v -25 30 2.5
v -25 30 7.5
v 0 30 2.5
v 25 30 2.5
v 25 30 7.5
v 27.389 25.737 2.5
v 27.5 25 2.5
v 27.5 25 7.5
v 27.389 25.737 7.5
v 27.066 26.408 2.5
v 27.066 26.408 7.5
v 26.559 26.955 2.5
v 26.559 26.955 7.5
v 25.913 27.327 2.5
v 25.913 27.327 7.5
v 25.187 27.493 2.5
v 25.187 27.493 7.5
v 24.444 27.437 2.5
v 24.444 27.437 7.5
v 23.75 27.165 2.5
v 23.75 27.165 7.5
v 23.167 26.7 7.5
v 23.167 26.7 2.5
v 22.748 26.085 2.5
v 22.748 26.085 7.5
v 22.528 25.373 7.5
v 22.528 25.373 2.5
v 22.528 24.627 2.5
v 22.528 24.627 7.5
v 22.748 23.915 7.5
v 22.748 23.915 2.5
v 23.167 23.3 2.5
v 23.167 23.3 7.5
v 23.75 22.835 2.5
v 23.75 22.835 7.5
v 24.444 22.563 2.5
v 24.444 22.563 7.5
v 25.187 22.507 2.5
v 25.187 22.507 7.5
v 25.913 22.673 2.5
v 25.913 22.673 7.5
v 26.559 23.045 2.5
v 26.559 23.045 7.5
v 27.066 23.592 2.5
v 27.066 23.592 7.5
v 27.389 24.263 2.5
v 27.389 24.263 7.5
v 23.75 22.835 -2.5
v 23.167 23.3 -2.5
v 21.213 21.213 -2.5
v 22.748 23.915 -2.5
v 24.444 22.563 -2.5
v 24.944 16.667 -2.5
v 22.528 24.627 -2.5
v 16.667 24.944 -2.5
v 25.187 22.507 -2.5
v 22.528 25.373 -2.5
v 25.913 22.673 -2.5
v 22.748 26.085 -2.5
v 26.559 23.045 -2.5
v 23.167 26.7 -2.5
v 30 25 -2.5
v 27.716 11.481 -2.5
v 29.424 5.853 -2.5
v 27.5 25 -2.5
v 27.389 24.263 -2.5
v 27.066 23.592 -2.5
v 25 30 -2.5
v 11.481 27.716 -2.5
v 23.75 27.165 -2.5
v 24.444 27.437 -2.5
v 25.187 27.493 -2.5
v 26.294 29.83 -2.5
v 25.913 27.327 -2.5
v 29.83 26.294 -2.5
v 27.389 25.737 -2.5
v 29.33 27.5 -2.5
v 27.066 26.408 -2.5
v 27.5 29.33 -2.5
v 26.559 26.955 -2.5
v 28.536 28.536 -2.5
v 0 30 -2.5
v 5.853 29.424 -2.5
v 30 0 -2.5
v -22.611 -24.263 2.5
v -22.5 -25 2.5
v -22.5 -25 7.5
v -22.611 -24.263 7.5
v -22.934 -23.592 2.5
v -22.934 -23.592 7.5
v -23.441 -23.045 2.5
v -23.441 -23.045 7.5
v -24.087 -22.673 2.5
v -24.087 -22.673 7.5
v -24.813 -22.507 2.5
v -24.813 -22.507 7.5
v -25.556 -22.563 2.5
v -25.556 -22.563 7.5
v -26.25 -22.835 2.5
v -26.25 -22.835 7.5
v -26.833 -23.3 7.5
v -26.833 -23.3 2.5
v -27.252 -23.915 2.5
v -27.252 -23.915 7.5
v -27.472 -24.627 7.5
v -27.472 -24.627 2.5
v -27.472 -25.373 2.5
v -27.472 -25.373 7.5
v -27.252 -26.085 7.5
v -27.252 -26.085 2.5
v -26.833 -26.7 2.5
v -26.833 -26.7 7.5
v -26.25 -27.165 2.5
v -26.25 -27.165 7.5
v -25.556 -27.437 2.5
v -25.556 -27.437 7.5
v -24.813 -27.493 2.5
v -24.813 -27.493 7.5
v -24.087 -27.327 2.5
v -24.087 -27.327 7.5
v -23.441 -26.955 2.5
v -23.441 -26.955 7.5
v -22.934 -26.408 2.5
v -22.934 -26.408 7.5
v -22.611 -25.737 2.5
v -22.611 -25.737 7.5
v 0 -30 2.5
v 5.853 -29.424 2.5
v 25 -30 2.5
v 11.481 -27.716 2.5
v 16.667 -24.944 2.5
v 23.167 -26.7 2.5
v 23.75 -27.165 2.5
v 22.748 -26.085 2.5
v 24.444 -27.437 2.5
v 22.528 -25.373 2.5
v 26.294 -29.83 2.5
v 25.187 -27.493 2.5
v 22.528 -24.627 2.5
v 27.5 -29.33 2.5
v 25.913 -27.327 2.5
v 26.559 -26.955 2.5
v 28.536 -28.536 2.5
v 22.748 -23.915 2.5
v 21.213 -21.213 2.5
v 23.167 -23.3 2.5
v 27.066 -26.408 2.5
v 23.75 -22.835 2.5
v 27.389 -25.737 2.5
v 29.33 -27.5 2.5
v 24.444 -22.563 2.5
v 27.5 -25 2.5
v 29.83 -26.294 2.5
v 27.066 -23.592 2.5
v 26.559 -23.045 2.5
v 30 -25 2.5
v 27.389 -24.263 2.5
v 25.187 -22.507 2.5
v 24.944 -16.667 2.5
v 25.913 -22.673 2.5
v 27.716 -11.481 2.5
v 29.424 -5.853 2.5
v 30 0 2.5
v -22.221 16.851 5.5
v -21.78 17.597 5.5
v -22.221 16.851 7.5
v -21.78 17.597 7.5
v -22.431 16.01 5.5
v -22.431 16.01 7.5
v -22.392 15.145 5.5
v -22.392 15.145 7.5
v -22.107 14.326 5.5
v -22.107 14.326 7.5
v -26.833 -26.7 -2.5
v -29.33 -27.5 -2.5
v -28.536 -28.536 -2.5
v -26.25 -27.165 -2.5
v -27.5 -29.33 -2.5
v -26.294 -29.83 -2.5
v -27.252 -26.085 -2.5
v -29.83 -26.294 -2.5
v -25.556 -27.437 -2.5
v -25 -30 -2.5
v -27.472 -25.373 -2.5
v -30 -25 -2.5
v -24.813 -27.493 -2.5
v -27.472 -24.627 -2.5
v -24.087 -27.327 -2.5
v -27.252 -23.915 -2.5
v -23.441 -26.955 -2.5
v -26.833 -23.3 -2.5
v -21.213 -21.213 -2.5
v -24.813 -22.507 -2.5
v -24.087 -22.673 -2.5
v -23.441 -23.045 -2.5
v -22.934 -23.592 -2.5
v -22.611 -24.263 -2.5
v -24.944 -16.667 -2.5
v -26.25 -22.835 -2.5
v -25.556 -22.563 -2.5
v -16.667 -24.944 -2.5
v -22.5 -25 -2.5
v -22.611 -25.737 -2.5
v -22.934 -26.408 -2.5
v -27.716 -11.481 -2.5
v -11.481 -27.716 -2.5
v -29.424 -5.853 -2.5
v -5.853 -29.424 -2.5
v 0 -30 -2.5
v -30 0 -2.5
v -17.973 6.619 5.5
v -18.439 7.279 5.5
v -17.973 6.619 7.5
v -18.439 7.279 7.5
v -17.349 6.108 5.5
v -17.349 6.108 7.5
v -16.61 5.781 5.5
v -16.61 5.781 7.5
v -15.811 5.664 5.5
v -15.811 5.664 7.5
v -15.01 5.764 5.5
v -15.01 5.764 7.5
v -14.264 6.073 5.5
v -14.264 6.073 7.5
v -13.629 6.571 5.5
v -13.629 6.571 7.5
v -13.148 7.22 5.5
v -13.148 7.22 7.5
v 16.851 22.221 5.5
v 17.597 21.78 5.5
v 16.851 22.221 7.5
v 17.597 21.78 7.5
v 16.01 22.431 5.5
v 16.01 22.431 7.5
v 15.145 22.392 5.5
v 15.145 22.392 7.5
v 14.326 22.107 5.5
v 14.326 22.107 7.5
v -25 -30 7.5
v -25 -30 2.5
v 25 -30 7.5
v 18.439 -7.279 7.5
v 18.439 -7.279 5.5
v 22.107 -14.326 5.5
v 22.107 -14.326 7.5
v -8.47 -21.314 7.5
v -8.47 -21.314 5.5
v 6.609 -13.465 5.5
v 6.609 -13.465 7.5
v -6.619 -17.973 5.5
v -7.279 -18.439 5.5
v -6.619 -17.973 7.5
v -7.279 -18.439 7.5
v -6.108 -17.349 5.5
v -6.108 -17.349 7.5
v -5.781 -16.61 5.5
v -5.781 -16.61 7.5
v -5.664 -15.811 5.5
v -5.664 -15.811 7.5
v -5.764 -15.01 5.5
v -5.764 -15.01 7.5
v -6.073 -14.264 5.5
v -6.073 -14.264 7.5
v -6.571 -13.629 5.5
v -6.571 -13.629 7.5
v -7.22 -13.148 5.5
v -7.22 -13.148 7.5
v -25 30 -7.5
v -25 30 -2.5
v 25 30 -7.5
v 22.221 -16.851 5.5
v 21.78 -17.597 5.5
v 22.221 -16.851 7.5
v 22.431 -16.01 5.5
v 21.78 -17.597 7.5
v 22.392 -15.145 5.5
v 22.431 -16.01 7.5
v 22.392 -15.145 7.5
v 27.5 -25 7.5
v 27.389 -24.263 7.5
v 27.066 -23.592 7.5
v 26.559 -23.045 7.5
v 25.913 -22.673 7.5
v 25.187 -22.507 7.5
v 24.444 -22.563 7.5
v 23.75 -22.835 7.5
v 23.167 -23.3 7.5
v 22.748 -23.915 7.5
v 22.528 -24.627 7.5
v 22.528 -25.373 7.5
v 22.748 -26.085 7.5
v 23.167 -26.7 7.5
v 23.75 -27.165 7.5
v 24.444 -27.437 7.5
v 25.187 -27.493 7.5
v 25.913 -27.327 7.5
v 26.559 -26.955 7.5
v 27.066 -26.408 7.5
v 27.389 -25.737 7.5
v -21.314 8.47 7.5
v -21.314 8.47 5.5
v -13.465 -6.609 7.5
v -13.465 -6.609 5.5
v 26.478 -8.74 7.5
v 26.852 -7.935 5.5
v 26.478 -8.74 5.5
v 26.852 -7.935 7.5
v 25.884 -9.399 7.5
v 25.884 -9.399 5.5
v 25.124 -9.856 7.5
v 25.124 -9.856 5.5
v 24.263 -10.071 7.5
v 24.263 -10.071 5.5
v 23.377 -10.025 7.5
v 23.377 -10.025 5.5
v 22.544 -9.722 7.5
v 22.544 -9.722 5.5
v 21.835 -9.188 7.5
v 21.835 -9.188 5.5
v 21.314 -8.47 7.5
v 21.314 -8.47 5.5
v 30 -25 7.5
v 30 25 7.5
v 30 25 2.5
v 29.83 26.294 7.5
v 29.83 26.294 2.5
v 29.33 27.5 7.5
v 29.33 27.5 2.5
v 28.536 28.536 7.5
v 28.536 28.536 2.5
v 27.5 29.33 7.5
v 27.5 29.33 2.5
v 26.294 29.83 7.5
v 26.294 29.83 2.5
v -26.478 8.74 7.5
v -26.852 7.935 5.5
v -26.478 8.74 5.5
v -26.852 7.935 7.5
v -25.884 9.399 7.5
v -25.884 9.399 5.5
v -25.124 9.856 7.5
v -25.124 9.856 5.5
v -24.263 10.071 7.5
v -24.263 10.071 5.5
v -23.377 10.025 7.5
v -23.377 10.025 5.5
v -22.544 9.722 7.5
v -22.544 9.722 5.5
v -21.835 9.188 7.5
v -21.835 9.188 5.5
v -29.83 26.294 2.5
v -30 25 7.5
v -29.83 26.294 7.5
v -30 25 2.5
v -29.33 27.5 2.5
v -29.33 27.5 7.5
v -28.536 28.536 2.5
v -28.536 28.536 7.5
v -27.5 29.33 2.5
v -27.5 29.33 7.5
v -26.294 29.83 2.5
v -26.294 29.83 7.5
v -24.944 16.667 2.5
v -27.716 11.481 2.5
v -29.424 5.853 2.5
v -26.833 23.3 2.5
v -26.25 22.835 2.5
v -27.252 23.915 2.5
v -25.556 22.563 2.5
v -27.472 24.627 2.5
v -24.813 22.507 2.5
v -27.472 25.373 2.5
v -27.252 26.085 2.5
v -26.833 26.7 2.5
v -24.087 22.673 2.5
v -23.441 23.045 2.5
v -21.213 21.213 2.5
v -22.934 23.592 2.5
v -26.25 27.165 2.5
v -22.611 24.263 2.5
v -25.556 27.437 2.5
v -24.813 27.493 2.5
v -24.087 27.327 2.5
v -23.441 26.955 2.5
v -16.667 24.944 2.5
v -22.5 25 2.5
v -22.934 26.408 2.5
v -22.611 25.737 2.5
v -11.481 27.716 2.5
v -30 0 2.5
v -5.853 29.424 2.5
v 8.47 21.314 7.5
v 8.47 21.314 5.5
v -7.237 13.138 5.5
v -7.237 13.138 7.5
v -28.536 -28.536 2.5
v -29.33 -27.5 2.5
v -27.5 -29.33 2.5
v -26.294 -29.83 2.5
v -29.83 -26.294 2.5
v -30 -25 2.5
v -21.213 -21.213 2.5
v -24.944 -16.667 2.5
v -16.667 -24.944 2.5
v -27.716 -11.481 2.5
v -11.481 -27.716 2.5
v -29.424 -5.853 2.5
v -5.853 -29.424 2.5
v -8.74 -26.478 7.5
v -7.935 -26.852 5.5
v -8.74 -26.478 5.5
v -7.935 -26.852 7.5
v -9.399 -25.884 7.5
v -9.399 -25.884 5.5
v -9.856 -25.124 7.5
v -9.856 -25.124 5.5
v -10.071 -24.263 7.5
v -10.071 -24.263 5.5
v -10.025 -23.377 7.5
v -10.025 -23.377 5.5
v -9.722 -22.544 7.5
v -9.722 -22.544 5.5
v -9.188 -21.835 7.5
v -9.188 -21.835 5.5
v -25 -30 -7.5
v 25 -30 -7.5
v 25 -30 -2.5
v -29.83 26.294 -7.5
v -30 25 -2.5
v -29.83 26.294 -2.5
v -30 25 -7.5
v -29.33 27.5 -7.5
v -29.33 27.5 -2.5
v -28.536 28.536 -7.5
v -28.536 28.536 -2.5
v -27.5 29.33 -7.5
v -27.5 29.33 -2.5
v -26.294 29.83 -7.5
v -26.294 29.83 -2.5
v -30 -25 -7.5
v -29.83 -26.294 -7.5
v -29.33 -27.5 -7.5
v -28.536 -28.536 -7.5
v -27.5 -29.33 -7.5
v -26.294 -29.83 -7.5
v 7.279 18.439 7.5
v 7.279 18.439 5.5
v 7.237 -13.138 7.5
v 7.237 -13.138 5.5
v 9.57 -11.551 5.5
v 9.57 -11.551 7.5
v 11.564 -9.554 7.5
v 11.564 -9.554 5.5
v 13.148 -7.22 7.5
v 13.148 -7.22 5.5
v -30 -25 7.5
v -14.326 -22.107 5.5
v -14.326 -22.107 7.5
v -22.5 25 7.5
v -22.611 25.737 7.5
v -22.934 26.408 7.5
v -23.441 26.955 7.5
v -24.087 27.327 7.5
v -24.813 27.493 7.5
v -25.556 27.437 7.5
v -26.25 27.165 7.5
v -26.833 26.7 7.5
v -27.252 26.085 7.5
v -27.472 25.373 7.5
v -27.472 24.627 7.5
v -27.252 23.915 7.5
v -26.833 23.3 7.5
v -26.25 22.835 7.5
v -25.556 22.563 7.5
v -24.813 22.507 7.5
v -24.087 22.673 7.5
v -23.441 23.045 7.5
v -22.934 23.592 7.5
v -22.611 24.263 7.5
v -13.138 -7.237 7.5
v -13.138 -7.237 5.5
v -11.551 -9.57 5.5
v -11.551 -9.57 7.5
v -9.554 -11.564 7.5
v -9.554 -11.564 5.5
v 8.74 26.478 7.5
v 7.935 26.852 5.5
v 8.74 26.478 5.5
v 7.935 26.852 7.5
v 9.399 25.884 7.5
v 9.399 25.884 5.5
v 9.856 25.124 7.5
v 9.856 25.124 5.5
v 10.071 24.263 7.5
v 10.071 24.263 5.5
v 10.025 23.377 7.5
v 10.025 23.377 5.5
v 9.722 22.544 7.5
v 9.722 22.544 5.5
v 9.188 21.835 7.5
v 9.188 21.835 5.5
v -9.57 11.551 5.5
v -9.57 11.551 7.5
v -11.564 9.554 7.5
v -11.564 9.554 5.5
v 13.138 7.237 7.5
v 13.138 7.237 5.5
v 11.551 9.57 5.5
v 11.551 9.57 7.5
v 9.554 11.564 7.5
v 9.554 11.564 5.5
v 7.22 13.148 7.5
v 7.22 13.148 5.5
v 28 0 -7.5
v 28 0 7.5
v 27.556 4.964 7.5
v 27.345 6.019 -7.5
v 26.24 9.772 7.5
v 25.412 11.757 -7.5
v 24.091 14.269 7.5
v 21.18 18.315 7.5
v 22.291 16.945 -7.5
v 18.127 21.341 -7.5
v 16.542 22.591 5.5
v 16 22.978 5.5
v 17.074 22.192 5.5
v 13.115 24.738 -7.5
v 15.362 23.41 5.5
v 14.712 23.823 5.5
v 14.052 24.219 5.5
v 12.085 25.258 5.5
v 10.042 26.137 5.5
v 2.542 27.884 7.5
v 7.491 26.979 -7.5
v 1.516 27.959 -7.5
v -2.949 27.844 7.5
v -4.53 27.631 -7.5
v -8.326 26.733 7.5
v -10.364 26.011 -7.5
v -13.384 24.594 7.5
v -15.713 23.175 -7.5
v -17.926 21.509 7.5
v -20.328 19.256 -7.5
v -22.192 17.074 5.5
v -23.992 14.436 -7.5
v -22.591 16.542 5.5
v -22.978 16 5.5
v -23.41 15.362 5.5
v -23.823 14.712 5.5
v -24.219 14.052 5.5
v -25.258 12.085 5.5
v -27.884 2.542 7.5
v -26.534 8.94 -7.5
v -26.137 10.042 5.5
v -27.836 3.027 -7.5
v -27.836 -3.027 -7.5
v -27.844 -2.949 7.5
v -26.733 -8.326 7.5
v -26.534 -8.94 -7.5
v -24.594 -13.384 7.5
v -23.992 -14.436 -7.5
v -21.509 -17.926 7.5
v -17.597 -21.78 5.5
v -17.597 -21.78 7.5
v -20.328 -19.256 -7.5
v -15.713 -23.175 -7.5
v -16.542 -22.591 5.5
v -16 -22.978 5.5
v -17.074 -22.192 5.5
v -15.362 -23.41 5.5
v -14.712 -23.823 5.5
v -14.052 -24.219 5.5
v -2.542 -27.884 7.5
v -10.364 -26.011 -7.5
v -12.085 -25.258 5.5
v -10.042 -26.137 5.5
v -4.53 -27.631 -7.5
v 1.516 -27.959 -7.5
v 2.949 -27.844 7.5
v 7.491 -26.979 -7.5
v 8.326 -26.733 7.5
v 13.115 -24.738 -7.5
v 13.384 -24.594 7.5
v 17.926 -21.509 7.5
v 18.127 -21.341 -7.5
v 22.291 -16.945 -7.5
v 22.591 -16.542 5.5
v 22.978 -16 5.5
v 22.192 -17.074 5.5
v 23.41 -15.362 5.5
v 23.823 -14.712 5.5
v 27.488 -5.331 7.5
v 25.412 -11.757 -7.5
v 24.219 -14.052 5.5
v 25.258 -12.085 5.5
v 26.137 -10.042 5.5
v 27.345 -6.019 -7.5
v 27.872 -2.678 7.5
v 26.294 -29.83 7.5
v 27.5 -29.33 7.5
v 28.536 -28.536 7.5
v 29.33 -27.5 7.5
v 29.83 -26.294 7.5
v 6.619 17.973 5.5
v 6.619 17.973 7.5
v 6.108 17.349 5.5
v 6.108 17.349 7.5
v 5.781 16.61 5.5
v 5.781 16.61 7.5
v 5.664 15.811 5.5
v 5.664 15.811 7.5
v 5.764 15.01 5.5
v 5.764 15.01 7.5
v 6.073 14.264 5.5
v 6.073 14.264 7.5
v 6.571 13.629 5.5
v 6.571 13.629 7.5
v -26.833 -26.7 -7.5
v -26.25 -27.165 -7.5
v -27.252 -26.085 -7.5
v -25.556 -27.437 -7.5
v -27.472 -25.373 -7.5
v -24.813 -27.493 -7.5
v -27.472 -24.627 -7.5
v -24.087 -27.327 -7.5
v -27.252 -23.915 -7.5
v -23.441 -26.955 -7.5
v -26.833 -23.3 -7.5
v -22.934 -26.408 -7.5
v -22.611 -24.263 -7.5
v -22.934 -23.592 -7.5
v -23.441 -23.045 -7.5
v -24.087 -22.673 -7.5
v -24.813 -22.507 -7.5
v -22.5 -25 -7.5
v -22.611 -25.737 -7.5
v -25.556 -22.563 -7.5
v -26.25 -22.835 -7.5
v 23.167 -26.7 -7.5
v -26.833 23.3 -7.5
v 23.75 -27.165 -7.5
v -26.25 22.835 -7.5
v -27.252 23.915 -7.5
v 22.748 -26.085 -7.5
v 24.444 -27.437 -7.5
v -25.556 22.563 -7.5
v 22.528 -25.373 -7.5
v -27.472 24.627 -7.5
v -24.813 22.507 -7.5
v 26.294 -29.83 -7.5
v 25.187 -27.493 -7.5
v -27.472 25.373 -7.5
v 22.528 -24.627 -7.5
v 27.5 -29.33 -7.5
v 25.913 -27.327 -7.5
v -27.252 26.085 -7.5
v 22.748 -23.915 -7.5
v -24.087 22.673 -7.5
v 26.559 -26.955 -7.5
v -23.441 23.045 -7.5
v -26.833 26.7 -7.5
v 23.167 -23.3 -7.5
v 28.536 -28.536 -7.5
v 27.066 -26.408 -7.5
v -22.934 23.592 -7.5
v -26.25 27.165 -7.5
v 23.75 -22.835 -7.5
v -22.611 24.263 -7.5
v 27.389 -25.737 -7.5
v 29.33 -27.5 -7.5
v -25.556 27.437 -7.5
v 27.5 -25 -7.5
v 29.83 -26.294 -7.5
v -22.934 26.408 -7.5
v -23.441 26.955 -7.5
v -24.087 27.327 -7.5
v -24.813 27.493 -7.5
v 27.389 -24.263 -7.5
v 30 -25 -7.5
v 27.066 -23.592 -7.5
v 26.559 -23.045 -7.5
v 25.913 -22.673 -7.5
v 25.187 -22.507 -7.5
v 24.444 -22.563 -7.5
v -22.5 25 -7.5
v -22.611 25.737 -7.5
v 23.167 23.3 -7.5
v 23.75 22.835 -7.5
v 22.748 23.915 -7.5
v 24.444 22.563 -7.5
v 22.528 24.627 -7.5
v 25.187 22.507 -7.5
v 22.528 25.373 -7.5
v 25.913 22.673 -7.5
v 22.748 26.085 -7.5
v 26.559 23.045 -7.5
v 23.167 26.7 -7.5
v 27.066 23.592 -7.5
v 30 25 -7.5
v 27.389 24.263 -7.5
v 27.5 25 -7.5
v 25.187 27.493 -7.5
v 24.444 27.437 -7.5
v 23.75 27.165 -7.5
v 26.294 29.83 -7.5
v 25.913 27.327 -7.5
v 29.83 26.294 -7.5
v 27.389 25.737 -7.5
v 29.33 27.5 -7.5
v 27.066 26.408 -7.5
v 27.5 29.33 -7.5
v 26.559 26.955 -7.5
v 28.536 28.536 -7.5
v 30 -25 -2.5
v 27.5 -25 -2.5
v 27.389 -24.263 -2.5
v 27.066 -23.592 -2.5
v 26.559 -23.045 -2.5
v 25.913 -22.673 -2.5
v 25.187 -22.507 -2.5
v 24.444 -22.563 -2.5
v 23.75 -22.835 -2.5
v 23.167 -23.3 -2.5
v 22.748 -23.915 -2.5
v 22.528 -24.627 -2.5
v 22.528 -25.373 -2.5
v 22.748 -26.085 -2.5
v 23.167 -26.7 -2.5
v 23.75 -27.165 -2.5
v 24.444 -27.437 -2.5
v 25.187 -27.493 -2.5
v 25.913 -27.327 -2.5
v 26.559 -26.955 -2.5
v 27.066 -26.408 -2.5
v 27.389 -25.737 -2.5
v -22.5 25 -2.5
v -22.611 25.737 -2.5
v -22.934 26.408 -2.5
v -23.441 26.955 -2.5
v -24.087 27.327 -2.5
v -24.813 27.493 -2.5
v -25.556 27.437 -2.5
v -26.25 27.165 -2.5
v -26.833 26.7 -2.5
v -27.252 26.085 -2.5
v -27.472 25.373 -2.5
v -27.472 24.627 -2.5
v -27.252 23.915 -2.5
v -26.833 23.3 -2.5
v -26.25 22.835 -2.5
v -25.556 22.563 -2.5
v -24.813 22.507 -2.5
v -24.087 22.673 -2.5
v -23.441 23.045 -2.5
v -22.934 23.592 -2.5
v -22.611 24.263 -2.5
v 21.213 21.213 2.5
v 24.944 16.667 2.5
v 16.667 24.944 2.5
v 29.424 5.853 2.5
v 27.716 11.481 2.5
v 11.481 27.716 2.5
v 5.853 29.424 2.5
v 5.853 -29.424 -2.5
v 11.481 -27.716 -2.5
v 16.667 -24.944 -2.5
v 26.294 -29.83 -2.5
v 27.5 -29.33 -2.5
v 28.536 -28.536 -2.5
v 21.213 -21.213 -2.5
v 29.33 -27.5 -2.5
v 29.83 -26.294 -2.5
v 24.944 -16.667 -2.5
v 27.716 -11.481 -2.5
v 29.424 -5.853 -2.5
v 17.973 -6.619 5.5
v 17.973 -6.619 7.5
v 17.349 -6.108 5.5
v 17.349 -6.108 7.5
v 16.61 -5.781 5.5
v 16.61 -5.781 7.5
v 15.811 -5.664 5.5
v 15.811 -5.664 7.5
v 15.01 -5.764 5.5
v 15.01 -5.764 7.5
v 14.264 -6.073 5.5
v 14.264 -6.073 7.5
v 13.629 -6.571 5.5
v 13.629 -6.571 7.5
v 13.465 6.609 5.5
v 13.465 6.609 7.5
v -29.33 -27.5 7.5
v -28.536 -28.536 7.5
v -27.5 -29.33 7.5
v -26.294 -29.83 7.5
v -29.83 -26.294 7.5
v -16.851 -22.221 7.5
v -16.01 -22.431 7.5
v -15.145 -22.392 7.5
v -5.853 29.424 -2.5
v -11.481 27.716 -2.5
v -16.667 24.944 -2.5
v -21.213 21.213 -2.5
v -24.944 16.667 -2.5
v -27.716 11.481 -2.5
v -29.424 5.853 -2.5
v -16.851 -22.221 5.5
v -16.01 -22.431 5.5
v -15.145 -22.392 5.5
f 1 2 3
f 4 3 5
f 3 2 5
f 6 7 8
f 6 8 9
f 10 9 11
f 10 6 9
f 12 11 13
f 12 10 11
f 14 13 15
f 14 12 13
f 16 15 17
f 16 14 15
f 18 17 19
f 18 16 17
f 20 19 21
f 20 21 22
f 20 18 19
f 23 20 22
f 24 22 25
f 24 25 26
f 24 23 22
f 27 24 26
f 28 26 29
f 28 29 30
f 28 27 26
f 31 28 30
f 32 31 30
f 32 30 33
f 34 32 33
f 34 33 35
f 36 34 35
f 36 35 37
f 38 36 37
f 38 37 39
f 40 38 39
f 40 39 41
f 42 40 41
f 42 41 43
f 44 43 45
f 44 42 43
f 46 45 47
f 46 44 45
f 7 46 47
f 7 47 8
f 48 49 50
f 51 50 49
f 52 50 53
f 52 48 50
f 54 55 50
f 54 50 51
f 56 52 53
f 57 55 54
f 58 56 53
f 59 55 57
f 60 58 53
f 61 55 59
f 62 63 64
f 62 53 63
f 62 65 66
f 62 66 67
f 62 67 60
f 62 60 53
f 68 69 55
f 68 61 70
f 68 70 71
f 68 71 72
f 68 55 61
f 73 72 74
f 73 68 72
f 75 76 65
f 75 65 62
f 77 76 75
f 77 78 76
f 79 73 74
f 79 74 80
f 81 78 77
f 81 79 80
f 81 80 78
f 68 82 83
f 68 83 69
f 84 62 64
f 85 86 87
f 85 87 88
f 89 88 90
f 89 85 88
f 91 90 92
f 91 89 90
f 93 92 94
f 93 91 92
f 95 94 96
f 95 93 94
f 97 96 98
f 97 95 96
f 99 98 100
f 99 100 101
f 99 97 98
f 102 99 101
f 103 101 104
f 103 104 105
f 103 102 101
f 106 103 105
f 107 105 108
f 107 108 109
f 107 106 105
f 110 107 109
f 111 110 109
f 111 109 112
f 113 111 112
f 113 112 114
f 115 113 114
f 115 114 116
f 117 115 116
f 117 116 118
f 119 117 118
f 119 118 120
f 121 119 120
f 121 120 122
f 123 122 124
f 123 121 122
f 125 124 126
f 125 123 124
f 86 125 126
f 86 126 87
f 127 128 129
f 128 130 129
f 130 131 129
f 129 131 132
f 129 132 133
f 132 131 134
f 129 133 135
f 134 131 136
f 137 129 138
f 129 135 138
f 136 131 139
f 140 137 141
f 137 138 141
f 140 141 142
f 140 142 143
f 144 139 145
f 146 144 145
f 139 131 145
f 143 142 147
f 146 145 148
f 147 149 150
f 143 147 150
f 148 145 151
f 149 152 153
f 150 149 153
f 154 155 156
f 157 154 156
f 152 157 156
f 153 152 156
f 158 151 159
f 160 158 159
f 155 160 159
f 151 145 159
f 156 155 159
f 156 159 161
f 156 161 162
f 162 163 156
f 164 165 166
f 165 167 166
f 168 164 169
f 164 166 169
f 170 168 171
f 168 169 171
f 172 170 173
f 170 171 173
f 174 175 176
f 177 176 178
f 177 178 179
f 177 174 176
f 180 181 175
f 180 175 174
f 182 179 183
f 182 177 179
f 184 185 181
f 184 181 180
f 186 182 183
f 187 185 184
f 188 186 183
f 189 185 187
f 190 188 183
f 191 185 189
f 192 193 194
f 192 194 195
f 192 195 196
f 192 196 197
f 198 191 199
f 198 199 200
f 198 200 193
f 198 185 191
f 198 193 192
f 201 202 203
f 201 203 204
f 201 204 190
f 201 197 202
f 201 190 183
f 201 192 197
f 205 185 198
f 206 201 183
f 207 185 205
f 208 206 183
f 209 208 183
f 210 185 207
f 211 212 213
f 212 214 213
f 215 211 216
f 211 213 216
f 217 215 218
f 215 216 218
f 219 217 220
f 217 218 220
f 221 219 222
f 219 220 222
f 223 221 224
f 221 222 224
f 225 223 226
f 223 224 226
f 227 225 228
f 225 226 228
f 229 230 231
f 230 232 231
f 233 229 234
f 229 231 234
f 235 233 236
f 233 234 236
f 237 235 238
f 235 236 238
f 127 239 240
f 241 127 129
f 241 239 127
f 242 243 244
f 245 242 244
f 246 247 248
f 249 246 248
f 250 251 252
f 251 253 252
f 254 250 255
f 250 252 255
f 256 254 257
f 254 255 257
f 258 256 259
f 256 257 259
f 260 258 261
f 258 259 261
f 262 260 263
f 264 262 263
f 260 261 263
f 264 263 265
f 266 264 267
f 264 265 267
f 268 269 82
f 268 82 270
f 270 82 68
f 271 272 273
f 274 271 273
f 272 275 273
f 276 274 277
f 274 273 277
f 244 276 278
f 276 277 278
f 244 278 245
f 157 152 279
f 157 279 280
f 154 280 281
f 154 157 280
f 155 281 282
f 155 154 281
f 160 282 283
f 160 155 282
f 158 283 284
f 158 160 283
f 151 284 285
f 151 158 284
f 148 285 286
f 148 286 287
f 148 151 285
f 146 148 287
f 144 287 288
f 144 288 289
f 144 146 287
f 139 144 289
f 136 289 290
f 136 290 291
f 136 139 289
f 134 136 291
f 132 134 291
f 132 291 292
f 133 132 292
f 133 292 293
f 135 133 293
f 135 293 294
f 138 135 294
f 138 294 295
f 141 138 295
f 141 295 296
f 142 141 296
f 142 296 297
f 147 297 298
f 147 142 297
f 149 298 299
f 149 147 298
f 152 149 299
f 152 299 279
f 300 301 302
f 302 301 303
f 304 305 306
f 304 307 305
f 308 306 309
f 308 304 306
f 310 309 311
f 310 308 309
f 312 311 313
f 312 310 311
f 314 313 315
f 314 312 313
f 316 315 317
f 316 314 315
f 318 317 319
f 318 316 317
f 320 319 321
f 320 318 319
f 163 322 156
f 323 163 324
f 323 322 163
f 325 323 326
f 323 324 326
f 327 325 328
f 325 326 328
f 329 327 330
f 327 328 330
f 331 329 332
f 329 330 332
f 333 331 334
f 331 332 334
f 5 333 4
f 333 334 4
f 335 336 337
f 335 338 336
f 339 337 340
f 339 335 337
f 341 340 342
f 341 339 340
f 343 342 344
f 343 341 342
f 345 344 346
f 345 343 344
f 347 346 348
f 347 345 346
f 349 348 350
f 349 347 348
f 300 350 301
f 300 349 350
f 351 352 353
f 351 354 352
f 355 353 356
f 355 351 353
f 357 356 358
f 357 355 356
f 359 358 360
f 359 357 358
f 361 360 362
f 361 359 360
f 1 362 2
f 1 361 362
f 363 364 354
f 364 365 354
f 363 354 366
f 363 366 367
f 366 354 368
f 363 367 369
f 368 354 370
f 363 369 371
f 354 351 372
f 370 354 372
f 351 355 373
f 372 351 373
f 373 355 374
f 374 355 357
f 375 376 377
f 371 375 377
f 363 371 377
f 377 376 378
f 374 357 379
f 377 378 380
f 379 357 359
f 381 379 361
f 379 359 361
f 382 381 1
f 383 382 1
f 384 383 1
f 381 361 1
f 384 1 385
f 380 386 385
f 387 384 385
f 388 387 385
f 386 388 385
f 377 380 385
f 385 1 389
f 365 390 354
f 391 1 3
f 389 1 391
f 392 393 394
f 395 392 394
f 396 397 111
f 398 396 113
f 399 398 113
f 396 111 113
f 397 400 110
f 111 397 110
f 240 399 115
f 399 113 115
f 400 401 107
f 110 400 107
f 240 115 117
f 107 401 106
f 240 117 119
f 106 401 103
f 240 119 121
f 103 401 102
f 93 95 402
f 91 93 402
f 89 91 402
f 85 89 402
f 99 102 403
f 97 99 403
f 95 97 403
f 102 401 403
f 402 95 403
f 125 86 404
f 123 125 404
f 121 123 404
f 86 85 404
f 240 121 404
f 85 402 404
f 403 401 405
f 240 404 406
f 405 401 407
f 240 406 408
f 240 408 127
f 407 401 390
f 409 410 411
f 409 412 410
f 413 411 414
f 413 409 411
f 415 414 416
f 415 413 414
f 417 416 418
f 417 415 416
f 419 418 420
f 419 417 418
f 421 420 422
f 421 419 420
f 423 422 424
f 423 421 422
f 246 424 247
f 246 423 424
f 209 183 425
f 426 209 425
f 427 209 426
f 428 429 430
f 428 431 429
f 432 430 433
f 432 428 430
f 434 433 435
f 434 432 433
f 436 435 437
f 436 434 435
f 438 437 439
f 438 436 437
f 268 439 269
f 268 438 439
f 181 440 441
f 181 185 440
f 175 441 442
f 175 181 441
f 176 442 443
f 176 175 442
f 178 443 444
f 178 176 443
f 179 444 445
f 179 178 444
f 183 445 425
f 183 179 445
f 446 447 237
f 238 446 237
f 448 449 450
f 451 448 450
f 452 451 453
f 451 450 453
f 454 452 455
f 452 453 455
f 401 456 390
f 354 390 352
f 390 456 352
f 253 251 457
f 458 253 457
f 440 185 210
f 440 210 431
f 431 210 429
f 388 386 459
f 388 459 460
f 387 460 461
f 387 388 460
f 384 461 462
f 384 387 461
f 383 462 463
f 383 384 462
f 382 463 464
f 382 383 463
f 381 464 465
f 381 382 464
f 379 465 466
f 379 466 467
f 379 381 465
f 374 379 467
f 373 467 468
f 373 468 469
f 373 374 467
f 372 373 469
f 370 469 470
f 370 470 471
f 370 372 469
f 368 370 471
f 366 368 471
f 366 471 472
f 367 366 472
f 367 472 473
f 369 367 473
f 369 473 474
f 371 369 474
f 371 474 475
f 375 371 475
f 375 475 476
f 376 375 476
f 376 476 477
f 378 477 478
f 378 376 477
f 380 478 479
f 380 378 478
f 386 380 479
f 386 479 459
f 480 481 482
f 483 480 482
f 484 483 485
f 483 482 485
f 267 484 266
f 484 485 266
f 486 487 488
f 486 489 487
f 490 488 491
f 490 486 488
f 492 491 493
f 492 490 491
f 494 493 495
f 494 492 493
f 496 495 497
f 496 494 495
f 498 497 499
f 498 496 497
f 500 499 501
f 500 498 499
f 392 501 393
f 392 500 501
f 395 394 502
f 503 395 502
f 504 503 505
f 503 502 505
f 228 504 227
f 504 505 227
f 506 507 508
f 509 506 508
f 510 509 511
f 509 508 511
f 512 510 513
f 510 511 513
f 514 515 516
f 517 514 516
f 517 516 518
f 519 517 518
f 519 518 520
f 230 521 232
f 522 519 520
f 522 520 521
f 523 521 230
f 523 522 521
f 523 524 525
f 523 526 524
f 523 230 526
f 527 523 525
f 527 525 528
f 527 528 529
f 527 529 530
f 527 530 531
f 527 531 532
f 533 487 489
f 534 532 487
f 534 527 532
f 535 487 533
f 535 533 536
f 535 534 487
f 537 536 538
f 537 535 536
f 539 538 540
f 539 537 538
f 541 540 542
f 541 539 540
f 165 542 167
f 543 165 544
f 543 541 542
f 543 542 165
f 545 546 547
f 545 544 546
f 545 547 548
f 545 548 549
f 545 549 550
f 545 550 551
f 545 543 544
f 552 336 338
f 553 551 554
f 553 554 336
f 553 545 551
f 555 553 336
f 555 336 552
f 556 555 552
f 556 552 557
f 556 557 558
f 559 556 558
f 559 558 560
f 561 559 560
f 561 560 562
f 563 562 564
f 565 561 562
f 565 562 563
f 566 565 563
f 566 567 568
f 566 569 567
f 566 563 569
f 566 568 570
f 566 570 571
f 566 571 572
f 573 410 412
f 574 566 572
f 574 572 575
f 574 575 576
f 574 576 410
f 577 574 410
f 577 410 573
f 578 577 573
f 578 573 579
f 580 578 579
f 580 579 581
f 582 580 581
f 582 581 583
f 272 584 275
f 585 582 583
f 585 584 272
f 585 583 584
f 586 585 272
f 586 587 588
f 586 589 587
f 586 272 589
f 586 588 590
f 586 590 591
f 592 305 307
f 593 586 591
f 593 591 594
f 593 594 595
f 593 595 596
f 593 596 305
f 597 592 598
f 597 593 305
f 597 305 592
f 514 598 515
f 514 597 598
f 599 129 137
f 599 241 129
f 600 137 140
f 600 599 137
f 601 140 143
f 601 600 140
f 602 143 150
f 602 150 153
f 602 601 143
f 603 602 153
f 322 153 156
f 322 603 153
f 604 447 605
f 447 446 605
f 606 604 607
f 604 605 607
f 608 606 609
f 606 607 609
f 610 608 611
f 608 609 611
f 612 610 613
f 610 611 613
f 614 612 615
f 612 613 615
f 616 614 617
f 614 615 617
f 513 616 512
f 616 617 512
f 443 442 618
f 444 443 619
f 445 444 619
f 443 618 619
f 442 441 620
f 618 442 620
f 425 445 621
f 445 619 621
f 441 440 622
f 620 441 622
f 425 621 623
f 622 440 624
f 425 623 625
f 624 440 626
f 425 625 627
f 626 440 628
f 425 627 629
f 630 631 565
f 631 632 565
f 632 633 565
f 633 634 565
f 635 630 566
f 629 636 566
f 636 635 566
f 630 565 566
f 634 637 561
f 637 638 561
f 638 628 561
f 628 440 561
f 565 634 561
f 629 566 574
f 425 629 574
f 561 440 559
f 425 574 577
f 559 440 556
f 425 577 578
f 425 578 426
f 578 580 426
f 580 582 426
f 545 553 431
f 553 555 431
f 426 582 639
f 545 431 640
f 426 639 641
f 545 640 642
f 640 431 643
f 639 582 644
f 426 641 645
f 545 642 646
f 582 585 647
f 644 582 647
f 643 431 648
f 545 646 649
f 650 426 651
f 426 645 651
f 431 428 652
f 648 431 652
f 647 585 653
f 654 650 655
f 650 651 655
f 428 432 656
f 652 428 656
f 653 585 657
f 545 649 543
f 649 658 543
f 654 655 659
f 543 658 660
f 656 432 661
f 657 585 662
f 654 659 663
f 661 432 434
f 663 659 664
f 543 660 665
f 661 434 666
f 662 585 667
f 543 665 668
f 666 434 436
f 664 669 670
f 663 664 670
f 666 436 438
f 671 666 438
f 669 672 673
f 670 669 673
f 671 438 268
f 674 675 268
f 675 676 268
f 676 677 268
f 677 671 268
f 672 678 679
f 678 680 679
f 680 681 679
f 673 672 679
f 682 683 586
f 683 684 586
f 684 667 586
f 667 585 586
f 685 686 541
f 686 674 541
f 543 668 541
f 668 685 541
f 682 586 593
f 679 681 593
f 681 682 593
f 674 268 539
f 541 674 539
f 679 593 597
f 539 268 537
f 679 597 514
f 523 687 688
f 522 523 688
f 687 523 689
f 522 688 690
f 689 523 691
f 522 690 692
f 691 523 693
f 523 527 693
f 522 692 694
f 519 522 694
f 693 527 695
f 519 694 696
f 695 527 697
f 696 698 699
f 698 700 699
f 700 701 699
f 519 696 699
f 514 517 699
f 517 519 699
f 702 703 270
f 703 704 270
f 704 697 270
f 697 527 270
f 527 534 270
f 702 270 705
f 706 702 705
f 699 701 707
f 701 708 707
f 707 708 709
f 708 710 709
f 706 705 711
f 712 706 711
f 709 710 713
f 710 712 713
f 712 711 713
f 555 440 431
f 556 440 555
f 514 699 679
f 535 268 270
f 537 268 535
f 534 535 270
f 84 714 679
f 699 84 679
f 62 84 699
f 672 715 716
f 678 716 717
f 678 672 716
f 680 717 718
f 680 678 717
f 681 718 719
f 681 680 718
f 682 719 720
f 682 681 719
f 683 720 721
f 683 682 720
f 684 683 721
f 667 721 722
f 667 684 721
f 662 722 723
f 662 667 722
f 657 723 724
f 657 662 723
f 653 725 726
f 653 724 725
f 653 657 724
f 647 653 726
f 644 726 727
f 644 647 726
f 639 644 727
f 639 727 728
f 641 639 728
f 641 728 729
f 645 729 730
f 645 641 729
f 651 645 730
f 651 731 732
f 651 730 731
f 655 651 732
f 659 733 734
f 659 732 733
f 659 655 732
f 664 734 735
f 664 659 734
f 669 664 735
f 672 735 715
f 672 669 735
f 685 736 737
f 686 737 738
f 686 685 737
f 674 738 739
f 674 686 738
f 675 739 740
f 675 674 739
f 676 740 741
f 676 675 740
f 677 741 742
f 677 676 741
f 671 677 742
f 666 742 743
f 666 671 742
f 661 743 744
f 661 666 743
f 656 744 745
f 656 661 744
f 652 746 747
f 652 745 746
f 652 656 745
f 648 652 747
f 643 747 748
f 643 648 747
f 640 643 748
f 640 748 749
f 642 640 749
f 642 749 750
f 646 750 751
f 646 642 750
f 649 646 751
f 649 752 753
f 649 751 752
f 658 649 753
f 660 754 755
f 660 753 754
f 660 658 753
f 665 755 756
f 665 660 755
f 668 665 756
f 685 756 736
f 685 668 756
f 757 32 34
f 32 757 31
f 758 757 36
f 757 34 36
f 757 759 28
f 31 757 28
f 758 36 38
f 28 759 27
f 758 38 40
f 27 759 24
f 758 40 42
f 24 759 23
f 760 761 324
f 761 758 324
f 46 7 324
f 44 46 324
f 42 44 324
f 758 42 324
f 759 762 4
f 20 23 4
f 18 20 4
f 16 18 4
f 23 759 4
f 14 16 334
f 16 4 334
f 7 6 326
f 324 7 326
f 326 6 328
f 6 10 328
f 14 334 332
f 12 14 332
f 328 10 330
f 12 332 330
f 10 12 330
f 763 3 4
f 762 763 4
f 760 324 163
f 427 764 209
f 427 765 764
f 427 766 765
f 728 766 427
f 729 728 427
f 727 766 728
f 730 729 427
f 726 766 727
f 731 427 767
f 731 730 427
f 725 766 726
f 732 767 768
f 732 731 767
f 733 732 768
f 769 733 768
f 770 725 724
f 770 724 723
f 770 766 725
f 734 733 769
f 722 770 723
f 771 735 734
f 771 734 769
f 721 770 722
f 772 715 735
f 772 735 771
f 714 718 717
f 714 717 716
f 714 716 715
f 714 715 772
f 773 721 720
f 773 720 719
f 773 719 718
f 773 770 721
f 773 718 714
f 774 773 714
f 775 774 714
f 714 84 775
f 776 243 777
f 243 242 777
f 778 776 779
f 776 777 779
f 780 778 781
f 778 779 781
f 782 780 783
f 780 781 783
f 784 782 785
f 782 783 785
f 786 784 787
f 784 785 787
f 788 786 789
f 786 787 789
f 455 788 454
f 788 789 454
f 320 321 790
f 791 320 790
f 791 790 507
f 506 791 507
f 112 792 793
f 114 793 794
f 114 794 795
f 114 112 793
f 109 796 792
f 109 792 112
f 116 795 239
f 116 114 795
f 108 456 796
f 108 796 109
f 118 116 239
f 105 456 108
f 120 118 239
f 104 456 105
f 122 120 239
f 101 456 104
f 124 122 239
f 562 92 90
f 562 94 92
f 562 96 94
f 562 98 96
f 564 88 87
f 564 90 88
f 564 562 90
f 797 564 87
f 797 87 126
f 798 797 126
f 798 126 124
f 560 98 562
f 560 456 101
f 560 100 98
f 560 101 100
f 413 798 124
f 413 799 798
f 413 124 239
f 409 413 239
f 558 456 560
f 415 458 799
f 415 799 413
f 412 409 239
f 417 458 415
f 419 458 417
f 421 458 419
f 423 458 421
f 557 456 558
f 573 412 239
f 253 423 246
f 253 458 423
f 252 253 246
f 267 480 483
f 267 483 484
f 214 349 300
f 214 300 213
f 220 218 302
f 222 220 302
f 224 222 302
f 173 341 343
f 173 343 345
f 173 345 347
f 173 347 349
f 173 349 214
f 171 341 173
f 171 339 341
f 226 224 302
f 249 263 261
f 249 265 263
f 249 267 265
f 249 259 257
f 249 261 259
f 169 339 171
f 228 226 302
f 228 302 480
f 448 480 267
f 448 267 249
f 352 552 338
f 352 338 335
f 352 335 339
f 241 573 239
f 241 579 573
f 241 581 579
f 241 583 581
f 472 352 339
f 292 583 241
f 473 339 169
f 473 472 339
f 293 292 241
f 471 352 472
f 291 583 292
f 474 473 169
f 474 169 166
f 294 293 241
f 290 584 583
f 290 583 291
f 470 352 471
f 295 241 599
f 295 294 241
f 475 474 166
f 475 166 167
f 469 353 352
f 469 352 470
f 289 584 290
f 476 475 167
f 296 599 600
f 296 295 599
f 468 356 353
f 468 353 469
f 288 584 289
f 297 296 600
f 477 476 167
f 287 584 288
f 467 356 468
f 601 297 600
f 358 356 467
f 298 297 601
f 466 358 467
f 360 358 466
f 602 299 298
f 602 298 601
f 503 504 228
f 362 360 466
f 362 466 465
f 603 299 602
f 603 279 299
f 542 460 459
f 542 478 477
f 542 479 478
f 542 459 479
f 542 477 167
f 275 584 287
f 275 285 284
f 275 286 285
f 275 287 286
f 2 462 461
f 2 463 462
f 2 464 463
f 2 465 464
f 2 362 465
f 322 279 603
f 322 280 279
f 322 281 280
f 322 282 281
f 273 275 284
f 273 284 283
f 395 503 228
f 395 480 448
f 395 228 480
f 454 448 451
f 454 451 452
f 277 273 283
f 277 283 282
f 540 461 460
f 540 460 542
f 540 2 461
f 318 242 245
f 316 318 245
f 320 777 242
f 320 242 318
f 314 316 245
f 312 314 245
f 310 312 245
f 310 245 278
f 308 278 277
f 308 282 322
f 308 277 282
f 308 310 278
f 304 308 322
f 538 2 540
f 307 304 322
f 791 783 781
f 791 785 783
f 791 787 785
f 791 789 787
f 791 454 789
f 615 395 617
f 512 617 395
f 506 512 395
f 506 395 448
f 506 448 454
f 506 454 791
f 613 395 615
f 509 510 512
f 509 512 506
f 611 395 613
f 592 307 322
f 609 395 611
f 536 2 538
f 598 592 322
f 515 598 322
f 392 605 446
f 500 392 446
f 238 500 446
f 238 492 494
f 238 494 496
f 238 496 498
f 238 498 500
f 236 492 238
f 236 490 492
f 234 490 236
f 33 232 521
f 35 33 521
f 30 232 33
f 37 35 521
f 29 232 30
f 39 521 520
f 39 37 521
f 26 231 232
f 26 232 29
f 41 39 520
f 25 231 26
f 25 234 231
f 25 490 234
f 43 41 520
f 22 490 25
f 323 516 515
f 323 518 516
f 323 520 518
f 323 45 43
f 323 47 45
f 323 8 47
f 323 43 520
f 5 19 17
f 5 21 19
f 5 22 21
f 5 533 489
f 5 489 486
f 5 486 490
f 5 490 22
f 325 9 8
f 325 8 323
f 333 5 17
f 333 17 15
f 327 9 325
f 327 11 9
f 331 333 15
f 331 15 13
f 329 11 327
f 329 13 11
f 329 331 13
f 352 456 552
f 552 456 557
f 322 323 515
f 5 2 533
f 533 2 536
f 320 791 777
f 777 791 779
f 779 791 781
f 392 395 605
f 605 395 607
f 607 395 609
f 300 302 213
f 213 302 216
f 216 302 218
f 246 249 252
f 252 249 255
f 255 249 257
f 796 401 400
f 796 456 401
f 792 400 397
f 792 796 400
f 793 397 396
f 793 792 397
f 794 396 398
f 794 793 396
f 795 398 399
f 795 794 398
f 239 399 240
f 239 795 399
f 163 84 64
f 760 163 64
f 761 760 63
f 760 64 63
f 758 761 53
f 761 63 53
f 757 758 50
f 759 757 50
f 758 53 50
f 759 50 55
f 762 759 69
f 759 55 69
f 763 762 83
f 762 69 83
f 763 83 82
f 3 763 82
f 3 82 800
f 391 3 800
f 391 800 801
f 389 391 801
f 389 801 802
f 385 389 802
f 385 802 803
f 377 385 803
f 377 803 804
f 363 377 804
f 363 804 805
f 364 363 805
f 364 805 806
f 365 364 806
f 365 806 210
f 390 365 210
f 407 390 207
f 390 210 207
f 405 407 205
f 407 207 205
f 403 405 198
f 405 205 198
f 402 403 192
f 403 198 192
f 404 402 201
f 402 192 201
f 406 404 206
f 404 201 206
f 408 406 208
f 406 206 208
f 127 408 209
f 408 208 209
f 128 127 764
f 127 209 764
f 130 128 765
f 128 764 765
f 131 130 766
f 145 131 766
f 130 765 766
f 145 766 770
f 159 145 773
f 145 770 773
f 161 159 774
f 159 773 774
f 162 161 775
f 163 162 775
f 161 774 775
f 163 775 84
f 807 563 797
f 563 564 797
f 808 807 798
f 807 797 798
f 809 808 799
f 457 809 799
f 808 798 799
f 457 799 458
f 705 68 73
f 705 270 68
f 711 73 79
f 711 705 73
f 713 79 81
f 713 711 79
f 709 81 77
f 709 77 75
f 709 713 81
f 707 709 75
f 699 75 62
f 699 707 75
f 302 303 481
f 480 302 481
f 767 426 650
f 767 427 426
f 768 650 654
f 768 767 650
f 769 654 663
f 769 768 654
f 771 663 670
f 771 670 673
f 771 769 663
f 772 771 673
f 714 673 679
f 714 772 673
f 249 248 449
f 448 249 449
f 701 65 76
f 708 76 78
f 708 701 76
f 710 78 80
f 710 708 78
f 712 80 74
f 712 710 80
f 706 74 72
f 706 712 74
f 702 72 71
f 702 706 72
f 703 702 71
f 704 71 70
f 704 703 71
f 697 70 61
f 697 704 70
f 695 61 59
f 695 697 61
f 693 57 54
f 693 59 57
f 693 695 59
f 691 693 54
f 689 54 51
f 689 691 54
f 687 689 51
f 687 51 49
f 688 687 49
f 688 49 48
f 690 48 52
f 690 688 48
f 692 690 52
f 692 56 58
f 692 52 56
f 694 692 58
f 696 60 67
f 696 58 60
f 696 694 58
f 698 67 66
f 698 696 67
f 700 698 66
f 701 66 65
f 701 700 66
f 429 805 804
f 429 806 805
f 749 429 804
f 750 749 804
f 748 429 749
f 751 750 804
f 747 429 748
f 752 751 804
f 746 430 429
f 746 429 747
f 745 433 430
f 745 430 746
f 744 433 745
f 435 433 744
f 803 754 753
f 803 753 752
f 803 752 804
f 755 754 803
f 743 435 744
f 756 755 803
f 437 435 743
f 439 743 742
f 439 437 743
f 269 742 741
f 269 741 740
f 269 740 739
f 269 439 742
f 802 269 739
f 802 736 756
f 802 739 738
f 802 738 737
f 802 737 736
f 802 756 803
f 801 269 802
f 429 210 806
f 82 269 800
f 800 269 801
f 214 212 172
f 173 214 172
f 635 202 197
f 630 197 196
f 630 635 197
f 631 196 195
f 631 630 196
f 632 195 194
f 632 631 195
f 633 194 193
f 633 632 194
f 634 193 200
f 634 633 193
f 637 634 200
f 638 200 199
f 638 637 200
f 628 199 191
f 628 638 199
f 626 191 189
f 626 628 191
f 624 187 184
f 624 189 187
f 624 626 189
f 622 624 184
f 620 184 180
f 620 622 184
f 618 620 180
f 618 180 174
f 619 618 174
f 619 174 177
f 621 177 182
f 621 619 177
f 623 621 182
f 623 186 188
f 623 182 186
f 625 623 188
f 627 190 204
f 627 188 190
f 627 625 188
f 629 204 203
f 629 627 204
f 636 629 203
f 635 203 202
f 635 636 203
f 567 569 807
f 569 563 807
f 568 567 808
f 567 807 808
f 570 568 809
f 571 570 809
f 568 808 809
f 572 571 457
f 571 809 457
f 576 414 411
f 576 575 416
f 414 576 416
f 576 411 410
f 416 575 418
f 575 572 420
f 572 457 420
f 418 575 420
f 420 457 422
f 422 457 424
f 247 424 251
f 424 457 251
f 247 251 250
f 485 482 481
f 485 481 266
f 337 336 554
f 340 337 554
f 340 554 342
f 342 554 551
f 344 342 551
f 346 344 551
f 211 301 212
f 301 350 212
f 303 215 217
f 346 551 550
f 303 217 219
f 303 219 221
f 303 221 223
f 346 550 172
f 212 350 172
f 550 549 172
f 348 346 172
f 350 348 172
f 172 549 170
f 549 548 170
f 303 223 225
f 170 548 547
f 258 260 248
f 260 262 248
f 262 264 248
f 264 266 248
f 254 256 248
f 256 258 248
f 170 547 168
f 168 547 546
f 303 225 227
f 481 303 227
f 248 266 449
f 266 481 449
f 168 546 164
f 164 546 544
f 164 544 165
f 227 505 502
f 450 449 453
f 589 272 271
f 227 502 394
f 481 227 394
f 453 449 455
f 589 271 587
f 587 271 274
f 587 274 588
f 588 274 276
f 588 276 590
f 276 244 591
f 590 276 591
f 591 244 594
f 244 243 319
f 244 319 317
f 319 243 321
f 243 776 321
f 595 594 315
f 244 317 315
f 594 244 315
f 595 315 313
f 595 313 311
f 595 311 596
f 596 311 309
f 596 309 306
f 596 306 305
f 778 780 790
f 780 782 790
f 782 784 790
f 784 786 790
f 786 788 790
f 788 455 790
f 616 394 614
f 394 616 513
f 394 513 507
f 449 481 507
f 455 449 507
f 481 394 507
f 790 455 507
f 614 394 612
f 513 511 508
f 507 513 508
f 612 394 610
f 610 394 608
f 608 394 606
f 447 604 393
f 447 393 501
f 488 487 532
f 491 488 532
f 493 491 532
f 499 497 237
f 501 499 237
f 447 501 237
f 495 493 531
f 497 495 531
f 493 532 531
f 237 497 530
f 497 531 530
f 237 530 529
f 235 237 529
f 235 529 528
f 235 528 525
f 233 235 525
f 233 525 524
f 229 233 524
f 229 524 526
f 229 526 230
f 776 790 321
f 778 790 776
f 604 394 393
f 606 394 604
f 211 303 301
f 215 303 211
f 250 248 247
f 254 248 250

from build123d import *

# Parameters (mm, degrees)
SKETCH1_W           = 60
SKETCH1_H           = 60
SKETCH1_R           = 28
SKETCH1_R_2         = 2.5
BOSS_EXTRUDE1_DEPTH = 7.5
SKETCH2_W           = 83.422483418
SKETCH2_H           = 79.797227822
SKETCH2_R           = 30
CUT_EXTRUDE1_DEPTH  = 2.5
BOSS_EXTRUDE2_START = -2
BOSS_EXTRUDE2_DEPTH = 2
FILLET1_R           = 3
FILLET2_R           = 5


with BuildPart() as part:
    # Sketch1 → Boss-Extrude1 (new, symmetric)
    with BuildSketch(Plane.XY):
        Rectangle(SKETCH1_W, SKETCH1_H)
        Circle(SKETCH1_R, mode=Mode.SUBTRACT)
        with Locations((25, 25)):
            Circle(SKETCH1_R_2, mode=Mode.SUBTRACT)
        with Locations((-25, 25)):
            Circle(SKETCH1_R_2, mode=Mode.SUBTRACT)
        with Locations((-25, -25)):
            Circle(SKETCH1_R_2, mode=Mode.SUBTRACT)
        with Locations((25, -25)):
            Circle(SKETCH1_R_2, mode=Mode.SUBTRACT)
    extrude(amount=BOSS_EXTRUDE1_DEPTH, both=True)

    # Sketch2 → Cut-Extrude1 (cut, symmetric)
    with BuildSketch(Plane.XY):
        Rectangle(SKETCH2_W, SKETCH2_H)
        Circle(SKETCH2_R, mode=Mode.SUBTRACT)
    extrude(amount=CUT_EXTRUDE1_DEPTH, both=True, mode=Mode.SUBTRACT)

    # Sketch3 → Boss-Extrude2 (add)
    with BuildSketch(Plane.XY.offset(7.5).offset(BOSS_EXTRUDE2_START)):
        with BuildLine():
            Line((14.986146269, -0.644530834), (22.978250586, -16))
            ThreePointArc((22.978250586, -16), (23.61864626, -15.038601957), (24.218842251, -14.051607738))
            Line((24.218842251, -14.051607738), (13.465479299, 6.609150267))
            Line((13.465479299, 6.609150267), (13.13845395, 7.237473855))
            ThreePointArc((13.13845395, 7.237473855), (7.905893272, 12.747425292), (0.644530834, 14.986146269))
            Line((0.644530834, 14.986146269), (16, 22.978250586))
            ThreePointArc((16, 22.978250586), (15.038601957, 23.61864626), (14.051607738, 24.218842251))
            Line((14.051607738, 24.218842251), (-7.237473855, 13.13845395))
            ThreePointArc((-7.237473855, 13.13845395), (-12.747425292, 7.905893272), (-14.986146269, 0.644530834))
            Line((-14.986146269, 0.644530834), (-22.978250586, 16))
            ThreePointArc((-22.978250586, 16), (-23.61864626, 15.038601957), (-24.218842251, 14.051607738))
            Line((-24.218842251, 14.051607738), (-13.465479299, -6.609150267))
            Line((-13.465479299, -6.609150267), (-13.13845395, -7.237473855))
            ThreePointArc((-13.13845395, -7.237473855), (-7.905893272, -12.747425292), (-0.644530834, -14.986146269))
            Line((-0.644530834, -14.986146269), (-16, -22.978250586))
            ThreePointArc((-16, -22.978250586), (-15.038601957, -23.61864626), (-14.051607738, -24.218842251))
            Line((-14.051607738, -24.218842251), (6.609150267, -13.465479299))
            Line((6.609150267, -13.465479299), (7.237473855, -13.13845395))
            ThreePointArc((7.237473855, -13.13845395), (12.747425292, -7.905893272), (14.986146269, -0.644530834))
        make_face()
    extrude(amount=BOSS_EXTRUDE2_DEPTH)

    # Fillet1
    fillet1_edges = [part.edges().sort_by_distance(p)[0] for p in [
        (24.218842251, -14.051607738, 6.5),
        (22.978250586, -16, 6.5),
        (14.986146269, -0.644530834, 6.5),
        (-14.051607738, -24.218842251, 6.5),
        (-16, -22.978250586, 6.5),
        (-0.644530834, -14.986146269, 6.5),
        (-24.218842251, 14.051607738, 6.5),
        (-22.978250586, 16, 6.5),
        (-14.986146269, 0.644530834, 6.5),
        (14.051607738, 24.218842251, 6.5),
        (16, 22.978250586, 6.5),
        (0.644530834, 14.986146269, 6.5),
    ]]
    fillet(fillet1_edges, radius=FILLET1_R)

    # Fillet2
    fillet2_edges = [part.edges().sort_by_distance(p)[0] for p in [
        (30, -30, -5),
        (-30, -30, -5),
        (-30, 30, -5),
        (30, 30, -5),
        (30, -30, 5),
        (-30, -30, 5),
        (-30, 30, 5),
        (30, 30, 5),
    ]]
    fillet(fillet2_edges, radius=FILLET2_R)


solid = part.part
